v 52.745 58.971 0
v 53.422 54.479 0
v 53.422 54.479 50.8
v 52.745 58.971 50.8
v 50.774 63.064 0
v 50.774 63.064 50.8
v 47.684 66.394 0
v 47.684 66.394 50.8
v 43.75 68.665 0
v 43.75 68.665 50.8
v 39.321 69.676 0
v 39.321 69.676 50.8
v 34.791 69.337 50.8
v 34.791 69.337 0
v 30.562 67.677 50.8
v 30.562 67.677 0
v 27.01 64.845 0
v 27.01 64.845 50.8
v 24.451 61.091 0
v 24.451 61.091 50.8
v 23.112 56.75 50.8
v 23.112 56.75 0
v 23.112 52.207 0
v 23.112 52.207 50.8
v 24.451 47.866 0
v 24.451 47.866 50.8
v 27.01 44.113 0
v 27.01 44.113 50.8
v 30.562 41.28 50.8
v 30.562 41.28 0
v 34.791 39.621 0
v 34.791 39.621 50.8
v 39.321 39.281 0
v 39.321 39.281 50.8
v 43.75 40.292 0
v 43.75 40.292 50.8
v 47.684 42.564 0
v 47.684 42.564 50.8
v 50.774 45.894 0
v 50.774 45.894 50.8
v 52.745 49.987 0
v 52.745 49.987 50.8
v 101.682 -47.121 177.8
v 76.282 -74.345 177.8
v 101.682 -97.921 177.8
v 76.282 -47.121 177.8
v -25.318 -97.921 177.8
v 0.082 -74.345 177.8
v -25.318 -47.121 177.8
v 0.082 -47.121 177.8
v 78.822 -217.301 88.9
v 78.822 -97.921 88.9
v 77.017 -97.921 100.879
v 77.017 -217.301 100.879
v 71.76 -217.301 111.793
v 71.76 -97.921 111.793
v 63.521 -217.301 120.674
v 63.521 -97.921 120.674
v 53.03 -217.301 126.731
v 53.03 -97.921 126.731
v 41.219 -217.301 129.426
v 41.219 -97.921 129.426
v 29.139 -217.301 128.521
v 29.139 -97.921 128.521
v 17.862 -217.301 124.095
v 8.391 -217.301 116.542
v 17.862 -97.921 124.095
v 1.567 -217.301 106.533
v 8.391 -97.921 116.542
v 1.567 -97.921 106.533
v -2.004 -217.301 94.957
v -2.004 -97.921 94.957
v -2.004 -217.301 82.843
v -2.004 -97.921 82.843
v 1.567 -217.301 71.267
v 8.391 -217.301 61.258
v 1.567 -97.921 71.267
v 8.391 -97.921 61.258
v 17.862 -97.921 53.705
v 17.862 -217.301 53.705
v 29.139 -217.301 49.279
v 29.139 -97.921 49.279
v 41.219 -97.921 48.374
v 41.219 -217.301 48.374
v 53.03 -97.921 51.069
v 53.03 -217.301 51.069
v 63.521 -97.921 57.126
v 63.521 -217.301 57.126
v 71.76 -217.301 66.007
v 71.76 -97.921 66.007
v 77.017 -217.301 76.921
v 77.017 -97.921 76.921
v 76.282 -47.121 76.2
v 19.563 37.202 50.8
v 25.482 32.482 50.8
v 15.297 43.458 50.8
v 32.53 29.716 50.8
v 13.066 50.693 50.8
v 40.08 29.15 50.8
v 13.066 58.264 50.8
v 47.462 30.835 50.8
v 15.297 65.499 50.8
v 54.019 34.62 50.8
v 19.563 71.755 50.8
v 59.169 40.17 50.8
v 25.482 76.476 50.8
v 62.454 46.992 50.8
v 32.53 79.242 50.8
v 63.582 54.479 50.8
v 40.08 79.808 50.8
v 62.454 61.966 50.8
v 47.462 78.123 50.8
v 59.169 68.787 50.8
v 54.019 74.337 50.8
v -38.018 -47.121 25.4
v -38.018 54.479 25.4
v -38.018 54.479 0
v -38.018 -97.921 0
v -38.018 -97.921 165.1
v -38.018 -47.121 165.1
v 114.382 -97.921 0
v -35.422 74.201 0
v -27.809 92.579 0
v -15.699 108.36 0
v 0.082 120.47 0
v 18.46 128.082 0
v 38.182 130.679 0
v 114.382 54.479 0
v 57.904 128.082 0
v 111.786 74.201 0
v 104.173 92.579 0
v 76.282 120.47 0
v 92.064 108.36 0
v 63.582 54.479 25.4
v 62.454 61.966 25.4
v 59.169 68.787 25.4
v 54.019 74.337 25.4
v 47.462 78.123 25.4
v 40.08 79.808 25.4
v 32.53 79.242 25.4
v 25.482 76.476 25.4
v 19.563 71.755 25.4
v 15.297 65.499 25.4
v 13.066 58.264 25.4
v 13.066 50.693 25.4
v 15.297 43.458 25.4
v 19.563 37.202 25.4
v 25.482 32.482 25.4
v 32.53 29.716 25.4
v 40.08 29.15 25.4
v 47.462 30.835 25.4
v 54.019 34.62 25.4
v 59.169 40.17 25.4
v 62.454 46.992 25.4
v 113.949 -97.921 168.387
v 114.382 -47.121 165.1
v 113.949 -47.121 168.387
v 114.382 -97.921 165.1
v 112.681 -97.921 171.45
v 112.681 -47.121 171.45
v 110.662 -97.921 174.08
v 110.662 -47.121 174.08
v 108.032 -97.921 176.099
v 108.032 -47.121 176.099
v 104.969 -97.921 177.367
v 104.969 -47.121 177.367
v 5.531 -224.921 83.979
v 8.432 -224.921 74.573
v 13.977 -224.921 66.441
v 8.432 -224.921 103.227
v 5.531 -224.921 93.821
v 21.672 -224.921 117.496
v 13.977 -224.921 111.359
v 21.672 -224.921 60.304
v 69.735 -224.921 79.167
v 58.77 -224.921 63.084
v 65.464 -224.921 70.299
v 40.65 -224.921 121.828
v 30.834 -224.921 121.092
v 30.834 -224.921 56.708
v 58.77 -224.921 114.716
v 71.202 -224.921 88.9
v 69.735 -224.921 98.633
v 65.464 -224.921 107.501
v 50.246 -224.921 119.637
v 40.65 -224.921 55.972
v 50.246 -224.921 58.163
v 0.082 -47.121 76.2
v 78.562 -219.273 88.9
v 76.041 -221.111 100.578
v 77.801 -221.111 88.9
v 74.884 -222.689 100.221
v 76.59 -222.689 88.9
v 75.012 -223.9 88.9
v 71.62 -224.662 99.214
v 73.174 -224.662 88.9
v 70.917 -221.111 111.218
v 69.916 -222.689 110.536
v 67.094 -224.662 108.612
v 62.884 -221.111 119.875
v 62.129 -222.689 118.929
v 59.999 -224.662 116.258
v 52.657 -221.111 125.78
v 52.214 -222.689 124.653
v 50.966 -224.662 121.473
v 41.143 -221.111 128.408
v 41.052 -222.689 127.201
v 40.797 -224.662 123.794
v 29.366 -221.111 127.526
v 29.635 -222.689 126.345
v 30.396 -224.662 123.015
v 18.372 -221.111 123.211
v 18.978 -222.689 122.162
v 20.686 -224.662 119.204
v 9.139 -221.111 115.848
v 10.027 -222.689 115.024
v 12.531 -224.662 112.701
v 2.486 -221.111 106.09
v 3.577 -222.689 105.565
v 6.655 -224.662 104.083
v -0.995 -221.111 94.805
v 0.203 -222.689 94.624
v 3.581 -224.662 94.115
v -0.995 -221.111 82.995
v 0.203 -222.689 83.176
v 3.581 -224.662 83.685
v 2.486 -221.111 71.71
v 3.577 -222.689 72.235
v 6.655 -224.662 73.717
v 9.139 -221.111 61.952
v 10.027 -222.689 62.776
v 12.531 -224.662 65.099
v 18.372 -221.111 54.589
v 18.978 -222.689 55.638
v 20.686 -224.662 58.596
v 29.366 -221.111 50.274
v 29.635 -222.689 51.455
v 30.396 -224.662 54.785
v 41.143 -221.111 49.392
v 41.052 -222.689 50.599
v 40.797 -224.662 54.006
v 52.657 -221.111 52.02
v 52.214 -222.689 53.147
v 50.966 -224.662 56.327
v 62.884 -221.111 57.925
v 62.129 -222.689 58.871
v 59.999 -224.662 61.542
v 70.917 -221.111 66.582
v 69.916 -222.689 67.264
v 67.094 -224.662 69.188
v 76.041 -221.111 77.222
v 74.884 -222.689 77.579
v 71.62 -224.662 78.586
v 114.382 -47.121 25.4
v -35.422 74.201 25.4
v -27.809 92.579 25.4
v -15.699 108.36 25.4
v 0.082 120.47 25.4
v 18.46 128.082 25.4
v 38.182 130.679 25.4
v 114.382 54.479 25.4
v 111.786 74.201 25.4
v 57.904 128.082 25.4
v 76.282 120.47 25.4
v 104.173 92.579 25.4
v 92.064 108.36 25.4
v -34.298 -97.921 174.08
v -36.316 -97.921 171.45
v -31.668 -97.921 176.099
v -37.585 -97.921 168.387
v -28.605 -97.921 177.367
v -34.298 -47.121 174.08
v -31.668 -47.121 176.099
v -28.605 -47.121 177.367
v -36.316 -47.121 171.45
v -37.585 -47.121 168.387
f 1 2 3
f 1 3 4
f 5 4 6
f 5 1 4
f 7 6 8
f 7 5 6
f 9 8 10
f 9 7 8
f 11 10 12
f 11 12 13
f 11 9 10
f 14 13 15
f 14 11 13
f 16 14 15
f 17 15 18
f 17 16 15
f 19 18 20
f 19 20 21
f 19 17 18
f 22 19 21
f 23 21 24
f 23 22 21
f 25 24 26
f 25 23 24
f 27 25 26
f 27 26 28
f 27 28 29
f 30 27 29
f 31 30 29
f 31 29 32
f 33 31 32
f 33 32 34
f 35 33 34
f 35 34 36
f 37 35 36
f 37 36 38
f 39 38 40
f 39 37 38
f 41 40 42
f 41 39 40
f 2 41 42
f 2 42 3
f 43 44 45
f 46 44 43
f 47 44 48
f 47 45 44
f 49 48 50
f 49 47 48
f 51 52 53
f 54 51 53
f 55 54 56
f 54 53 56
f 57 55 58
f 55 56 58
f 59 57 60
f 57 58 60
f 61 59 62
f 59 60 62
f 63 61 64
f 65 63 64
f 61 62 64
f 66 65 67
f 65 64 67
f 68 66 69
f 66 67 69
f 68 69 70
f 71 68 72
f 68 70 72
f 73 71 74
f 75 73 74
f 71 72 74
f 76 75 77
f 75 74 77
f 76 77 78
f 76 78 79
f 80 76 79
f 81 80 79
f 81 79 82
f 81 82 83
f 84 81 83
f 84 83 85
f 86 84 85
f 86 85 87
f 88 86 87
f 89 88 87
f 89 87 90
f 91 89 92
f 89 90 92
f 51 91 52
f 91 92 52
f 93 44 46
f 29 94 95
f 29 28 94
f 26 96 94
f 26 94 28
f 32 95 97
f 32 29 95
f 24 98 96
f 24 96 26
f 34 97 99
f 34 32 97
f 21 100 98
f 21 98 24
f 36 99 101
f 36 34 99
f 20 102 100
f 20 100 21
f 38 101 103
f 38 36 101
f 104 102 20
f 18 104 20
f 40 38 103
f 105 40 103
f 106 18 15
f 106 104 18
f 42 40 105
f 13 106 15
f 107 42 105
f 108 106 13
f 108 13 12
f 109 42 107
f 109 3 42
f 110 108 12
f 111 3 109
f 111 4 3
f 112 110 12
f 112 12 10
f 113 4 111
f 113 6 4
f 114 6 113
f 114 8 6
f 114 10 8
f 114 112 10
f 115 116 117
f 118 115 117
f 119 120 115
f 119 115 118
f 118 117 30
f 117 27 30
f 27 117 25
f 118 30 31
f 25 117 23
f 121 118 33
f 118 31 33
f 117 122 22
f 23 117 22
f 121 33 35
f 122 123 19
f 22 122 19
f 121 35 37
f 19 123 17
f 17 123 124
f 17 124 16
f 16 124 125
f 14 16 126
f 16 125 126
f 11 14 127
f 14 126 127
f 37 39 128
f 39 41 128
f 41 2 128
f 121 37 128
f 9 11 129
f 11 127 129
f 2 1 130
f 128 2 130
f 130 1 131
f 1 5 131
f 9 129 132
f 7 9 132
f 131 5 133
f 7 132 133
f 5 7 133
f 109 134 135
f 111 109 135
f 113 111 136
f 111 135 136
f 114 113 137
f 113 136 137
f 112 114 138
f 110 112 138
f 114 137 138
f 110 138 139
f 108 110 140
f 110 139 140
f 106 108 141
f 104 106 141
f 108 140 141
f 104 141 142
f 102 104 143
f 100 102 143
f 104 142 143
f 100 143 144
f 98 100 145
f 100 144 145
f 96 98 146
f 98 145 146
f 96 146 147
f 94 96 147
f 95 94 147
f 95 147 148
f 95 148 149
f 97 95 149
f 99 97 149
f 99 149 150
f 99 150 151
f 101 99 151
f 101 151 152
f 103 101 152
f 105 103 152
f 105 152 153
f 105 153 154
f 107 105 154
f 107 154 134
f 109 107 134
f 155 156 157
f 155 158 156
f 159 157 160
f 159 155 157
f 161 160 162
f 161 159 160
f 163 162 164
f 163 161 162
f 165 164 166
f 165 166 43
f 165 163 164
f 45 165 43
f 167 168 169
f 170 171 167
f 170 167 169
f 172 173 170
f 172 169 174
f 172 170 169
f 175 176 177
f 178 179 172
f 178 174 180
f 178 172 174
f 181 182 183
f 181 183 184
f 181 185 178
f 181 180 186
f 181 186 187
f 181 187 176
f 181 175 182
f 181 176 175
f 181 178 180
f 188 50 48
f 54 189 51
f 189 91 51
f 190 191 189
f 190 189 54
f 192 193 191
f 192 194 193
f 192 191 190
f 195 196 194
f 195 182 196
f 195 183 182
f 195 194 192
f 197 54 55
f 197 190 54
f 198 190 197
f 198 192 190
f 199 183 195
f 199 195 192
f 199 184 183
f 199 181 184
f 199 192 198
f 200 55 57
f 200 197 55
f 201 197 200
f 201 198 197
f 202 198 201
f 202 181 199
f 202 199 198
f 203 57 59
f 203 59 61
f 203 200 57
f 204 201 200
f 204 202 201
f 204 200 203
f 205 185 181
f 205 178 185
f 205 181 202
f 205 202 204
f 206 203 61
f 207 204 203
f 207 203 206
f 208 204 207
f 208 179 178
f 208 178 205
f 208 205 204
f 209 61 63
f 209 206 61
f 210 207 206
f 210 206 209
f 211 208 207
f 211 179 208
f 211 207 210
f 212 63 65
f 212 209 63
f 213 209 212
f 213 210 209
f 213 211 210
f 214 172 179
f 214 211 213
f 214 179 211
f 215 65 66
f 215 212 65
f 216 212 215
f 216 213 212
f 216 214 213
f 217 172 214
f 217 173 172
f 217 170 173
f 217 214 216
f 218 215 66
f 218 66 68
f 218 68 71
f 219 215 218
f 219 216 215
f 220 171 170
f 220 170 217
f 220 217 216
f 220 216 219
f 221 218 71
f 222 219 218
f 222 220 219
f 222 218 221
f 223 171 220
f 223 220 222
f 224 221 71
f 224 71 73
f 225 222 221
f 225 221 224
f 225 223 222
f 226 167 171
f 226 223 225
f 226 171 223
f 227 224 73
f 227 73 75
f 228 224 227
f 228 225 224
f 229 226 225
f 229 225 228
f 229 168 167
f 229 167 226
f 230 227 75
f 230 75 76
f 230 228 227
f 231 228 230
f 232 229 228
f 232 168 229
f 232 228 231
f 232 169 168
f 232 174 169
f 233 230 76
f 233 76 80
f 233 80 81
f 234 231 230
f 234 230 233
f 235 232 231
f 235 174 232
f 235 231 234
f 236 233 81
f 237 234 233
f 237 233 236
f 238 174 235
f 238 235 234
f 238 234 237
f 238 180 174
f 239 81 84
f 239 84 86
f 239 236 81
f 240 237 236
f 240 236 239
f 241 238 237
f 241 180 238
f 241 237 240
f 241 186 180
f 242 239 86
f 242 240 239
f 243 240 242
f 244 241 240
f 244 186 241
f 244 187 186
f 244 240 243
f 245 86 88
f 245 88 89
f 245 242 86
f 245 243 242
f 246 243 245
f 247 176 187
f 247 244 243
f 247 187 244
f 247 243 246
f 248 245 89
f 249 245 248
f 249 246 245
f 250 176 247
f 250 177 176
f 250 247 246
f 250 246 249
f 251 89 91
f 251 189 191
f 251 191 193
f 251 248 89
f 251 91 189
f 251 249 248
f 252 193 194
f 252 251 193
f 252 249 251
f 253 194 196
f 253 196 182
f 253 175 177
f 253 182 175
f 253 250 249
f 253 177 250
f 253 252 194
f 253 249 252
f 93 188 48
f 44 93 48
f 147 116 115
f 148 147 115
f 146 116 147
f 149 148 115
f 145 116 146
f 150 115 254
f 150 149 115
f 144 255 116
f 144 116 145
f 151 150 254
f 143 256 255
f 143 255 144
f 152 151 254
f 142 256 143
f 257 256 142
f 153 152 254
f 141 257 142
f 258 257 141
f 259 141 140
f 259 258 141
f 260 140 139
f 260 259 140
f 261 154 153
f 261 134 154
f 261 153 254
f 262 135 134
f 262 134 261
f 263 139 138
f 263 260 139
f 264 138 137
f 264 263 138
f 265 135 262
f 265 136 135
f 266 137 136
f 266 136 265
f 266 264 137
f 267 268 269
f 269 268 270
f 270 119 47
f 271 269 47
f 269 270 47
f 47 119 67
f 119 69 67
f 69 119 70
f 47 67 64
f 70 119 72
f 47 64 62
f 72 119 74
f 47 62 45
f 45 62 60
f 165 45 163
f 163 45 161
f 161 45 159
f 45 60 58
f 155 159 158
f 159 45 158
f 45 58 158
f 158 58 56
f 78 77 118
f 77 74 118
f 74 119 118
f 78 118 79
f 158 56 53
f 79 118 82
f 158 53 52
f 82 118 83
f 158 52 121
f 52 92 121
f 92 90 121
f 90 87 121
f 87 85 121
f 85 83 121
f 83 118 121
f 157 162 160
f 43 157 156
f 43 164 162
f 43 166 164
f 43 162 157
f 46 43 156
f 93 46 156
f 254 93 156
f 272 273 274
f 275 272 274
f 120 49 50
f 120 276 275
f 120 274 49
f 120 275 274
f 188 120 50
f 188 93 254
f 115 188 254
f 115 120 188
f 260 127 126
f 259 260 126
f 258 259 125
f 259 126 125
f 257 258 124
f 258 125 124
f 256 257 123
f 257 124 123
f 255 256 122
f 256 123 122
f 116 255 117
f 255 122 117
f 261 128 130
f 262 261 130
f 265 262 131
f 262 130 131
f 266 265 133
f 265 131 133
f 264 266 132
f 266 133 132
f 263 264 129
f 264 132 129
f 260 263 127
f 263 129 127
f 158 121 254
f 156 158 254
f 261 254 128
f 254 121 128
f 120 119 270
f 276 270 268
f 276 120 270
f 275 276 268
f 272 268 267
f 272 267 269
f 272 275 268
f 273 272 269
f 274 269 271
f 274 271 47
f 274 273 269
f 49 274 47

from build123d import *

# Parameters (mm, degrees)
F0_R      = 25.4
F0_R_2    = 15.24
F1_DEPTH  = 50.8
F2_DEPTH  = 25.4
F0_W      = 152.4
F0_H      = 50.8
F3_DEPTH  = 177.8
F4_R      = 40.64
F5_DEPTH  = 127
F6_R      = 7.62
F9_DEPTH  = 164.846
F10_DEPTH = 38.1
F11_DEPTH = 38.1
F12_R     = 12.7


with BuildPart() as f1:
    # F0 (on Top) → F1 (new body)
    with BuildSketch(Plane.XY):
        with Locations((38.1820415974, 54.4787267387)):
            Circle(F0_R)
        with Locations((38.1820415974, 54.4787267387)):
            Circle(F0_R_2, mode=Mode.SUBTRACT)
    extrude(amount=F1_DEPTH)

    # F0 (on Top) → F2 (join)
    with BuildSketch(Plane.XY):
        with BuildLine():
            Line((114.3820415974, -47.1212732613), (114.3820415974, 54.4787267387))
            ThreePointArc((114.3820415974, 54.4787267387), (92.0635783238, 108.3602634651), (38.1820415974, 130.6787267387))
            ThreePointArc((38.1820415974, 130.6787267387), (-15.699495129, 108.3602634651), (-38.0179584026, 54.4787267387))
            Line((-38.0179584026, 54.4787267387), (-38.0179584026, -47.1212732613))
            Line((-38.0179584026, -47.1212732613), (114.3820415974, -47.1212732613))
        make_face()
        with Locations((38.1820415974, 54.4787267387)):
            Circle(F0_R, mode=Mode.SUBTRACT)
    extrude(amount=F2_DEPTH)

    # F0 (on Top) → F3 (join)
    with BuildSketch(Plane.XY):
        with Locations((38.1820415974, -72.5212732613)):
            Rectangle(F0_W, F0_H)
    extrude(amount=F3_DEPTH)

    # F4 (on face) → F5 (join)
    with BuildSketch(Plane.XZ.offset(97.9212732613)):
        with Locations((38.1820415974, 88.9)):
            Circle(F4_R)
    extrude(amount=F5_DEPTH)

    # F6
    f6_edges = [f1.edges().sort_by_distance(p)[0] for p in [
        (-2.457958, -224.921273, 88.9),
    ]]
    fillet(f6_edges, radius=F6_R)

    # F8 (on face) → F9 (cut)
    with BuildSketch(Plane(origin=(-38.0179584026, 0, 0), x_dir=(0, -1, 0), z_dir=(-1, 0, 0))):
        Polygon((74.3449112123, 177.8), (47.1212732613, 177.8), (47.1212732613, 76.2), align=None)
    extrude(amount=-F9_DEPTH, mode=Mode.SUBTRACT)

    # F7 (on face) → F10 (join)
    with BuildSketch(Plane.YZ.offset(114.3820415974)):
        Polygon((-47.1212732613, 25.4), (-47.1212732613, 76.2), (-74.3449112123, 177.8), (-97.9212732613, 177.8), (-97.9212732613, 0), (54.4787267387, 0), (54.4787267387, 25.4), align=None)
        Polygon((-47.1212732613, 76.2), (-47.1212732613, 177.8), (-74.3449112123, 177.8), align=None)
    extrude(amount=-F10_DEPTH)

    # F8 (on face) → F11 (join)
    with BuildSketch(Plane(origin=(-38.0179584026, 0, 0), x_dir=(0, -1, 0), z_dir=(-1, 0, 0))):
        Polygon((74.3449112123, 177.8), (47.1212732613, 177.8), (47.1212732613, 76.2), align=None)
        Polygon((74.3449112123, 177.8), (47.1212732613, 76.2), (47.1212732613, 25.4), (-54.4787267387, 25.4), (-54.4787267387, 0), (97.9212732613, 0), (97.9212732613, 177.8), align=None)
    extrude(amount=-F11_DEPTH)

    # F12
    f12_edges = [f1.edges().sort_by_distance(p)[0] for p in [
        (114.382042, -72.521273, 177.8),
        (-38.017958, -72.521273, 177.8),
    ]]
    fillet(f12_edges, radius=F12_R)


solid = f1.part
